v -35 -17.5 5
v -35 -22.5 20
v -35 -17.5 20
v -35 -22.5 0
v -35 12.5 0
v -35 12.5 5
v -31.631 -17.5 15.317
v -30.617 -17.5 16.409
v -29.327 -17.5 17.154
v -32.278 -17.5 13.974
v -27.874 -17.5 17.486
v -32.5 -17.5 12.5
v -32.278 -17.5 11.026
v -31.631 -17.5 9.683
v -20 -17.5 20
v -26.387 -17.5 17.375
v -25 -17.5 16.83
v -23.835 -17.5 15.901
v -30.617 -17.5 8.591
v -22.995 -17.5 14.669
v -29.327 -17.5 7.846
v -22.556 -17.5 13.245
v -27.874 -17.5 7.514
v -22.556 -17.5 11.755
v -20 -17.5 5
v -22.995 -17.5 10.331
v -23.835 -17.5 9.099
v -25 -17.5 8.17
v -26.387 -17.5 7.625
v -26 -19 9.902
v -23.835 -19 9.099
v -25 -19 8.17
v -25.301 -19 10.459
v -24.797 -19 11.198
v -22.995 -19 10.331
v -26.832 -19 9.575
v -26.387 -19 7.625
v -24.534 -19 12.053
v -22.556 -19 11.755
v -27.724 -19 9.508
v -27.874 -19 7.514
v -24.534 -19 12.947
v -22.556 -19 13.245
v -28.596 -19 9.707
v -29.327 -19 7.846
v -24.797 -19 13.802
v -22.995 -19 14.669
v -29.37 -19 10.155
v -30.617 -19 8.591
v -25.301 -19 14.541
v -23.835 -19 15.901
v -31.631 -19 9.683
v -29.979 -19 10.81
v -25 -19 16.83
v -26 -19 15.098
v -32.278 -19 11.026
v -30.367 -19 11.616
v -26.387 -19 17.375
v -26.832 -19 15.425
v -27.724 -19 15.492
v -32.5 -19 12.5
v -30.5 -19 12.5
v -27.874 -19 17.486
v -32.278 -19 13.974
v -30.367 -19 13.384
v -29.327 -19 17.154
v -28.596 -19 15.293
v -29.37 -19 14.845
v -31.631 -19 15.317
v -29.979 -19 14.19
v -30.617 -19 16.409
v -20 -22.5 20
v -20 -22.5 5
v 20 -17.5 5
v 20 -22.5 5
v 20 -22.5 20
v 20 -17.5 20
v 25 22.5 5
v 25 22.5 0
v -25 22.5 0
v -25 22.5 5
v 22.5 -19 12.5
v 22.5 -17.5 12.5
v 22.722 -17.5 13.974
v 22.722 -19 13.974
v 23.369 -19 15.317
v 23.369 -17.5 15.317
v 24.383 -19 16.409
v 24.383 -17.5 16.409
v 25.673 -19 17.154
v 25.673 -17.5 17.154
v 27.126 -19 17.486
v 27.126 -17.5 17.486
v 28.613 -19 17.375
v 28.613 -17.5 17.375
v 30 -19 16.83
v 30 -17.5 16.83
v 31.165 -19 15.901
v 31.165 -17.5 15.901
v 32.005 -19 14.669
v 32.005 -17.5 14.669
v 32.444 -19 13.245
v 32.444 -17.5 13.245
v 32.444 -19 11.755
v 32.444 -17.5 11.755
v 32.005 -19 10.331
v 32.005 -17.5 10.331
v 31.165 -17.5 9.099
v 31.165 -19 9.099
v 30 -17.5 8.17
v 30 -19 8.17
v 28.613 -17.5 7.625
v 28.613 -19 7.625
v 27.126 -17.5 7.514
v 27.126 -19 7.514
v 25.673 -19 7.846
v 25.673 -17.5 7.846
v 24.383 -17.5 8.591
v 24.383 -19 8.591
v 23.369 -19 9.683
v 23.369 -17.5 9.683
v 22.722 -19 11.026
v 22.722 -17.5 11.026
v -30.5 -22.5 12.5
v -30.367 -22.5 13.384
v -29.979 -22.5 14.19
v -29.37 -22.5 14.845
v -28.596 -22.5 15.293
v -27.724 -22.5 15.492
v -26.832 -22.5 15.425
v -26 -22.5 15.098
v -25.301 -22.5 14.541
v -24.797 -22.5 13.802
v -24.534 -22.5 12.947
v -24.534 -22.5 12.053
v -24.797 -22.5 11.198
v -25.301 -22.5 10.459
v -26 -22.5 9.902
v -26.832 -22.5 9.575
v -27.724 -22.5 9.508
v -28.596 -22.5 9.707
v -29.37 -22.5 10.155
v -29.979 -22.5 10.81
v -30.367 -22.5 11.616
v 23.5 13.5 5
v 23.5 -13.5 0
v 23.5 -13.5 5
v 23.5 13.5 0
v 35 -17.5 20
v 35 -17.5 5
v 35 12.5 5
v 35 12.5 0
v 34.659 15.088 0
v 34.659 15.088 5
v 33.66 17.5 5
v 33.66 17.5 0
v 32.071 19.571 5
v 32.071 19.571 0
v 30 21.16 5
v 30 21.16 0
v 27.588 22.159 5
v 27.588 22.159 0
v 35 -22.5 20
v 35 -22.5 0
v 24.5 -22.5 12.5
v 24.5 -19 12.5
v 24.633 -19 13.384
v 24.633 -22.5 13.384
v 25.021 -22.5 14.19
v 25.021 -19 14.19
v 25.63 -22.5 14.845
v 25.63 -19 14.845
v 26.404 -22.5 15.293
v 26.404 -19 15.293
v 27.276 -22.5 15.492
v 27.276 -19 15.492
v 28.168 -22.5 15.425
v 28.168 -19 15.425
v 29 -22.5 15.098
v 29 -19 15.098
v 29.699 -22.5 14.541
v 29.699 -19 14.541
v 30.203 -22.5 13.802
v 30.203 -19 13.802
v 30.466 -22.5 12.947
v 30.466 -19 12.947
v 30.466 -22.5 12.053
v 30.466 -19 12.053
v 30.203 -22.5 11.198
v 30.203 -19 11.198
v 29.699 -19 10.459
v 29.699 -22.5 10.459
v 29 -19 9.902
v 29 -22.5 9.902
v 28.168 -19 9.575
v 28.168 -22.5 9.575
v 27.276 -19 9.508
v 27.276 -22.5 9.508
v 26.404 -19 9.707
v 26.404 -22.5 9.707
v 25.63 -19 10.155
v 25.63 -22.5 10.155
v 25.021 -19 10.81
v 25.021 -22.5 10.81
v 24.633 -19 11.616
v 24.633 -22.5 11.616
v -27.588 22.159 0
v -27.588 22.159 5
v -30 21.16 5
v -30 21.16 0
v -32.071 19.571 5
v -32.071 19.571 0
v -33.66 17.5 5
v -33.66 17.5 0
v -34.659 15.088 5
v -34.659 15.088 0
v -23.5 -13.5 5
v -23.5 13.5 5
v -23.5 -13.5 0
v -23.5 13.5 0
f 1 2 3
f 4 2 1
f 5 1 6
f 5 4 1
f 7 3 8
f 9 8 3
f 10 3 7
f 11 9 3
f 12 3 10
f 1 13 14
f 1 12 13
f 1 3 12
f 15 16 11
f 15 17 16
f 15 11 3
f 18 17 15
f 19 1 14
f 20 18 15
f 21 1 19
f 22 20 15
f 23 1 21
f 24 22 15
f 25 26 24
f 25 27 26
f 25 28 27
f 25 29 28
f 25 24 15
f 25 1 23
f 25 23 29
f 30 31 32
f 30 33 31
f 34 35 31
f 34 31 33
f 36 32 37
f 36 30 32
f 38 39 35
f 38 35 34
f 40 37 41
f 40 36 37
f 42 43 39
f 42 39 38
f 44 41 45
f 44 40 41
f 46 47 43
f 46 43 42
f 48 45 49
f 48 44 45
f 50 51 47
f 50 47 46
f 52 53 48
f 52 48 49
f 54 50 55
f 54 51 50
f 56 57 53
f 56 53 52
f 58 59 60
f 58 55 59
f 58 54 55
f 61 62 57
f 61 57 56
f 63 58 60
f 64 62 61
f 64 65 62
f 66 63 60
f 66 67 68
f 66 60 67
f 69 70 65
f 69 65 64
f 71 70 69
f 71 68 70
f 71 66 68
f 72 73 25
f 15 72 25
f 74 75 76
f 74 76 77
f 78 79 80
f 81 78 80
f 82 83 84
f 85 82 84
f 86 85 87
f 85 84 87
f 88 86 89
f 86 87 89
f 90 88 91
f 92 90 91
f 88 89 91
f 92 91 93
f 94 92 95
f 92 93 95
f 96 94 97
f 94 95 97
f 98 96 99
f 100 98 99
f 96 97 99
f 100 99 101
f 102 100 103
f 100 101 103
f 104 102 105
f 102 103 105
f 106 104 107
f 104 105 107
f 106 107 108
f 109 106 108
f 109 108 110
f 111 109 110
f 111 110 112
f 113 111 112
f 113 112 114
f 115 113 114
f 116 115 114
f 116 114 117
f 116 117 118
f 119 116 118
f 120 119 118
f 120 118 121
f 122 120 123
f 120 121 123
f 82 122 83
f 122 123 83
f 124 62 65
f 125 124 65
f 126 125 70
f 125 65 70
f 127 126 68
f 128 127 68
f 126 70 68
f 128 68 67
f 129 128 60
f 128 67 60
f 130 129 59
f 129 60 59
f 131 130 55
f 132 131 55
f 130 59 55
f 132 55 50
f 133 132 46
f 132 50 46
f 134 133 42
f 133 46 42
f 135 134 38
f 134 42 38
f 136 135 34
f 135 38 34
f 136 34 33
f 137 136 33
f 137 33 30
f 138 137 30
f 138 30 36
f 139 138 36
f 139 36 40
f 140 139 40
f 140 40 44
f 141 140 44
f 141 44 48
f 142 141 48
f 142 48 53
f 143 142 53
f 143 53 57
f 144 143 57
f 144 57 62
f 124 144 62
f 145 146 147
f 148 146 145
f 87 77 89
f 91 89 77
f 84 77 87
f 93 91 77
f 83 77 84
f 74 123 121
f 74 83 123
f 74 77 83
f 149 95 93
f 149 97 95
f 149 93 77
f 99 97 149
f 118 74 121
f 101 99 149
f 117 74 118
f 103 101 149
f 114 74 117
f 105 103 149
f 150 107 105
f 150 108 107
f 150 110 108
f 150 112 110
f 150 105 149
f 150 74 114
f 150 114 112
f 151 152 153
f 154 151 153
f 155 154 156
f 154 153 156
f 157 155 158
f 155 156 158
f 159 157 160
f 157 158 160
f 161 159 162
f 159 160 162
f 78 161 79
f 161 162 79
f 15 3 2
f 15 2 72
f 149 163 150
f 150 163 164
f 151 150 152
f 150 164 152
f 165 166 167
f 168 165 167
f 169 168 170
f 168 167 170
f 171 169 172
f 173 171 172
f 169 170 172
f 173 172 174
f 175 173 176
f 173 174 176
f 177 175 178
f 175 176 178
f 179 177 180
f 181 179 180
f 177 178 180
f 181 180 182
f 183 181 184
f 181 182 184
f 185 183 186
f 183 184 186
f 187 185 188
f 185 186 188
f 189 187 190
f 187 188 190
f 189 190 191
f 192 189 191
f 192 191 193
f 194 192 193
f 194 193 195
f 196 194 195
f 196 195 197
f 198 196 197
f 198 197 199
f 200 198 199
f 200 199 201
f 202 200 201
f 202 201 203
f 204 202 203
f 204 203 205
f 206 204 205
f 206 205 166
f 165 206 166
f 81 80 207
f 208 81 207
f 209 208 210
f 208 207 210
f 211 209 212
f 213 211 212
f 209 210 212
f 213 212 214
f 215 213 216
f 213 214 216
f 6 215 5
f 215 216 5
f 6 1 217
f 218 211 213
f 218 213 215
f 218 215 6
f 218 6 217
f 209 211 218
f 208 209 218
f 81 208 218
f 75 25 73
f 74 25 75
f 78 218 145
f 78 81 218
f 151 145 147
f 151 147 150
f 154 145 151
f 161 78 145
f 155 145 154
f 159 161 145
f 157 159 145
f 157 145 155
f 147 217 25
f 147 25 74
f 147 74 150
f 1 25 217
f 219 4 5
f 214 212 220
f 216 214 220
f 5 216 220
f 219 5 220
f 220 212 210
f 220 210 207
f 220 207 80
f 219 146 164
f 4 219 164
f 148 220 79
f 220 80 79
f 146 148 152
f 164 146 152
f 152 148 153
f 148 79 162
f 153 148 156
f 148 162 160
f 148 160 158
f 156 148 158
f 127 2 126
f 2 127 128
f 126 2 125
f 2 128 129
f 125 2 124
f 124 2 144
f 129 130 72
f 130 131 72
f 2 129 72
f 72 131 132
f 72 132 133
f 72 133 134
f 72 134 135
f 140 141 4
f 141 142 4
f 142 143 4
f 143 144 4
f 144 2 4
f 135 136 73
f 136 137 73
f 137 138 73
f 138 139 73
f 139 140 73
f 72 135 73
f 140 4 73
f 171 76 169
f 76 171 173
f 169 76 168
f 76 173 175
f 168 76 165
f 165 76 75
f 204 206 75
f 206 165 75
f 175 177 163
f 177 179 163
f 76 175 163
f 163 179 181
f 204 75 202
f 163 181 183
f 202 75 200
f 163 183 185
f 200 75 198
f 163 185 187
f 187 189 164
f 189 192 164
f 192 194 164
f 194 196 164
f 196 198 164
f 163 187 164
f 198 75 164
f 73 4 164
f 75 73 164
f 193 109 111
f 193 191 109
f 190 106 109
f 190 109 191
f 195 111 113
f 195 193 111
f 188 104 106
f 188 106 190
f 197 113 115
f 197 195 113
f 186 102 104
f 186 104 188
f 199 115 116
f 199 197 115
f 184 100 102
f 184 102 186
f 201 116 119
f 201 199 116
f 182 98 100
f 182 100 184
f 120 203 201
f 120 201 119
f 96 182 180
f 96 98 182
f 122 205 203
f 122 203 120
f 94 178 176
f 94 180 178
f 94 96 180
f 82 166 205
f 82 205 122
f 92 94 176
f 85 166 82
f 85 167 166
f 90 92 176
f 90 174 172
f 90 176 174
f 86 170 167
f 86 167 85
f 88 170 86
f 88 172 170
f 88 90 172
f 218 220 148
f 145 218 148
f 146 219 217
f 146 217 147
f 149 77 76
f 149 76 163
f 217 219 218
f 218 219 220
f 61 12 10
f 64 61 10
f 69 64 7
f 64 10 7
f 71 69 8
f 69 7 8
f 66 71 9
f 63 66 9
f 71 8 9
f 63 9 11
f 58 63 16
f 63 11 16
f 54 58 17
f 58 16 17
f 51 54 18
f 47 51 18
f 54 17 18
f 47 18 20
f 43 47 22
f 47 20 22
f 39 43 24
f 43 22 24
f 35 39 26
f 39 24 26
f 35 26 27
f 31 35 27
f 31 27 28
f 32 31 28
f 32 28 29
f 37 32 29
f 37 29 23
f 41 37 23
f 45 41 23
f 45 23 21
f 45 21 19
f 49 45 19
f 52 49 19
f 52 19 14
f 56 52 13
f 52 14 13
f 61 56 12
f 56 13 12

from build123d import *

# Parameters (mm, degrees)
F1_DEPTH = 5
F2_W     = 47
F2_H     = 27
F3_DEPTH = 25
F4_W     = 15
F4_H     = 5
F5_DEPTH = 15
F6_R     = 3
F7_DEPTH = 25
F6_R_2   = 5
F8_DEPTH = 1.5


with BuildPart() as f1:
    # F0 (on Top) → F1 (new body)
    with BuildSketch(Plane.XY):
        with BuildLine():
            Line((-35, -22.5), (35, -22.5))
            Line((35, -22.5), (35, 12.5))
            ThreePointArc((35, 12.5), (32.071068, 19.571068), (25, 22.5))
            Line((25, 22.5), (-25, 22.5))
            ThreePointArc((-25, 22.5), (-32.071068, 19.571068), (-35, 12.5))
            Line((-35, 12.5), (-35, -22.5))
        make_face()
    extrude(amount=F1_DEPTH)

    # F2 (on Top) → F3 (cut)
    with BuildSketch(Plane.XY):
        Rectangle(F2_W, F2_H)
    extrude(amount=F3_DEPTH, mode=Mode.SUBTRACT)

    # F4 (on face) → F5 (join)
    with BuildSketch(Plane.XY.offset(5)):
        with Locations((-27.5, -20)):
            Rectangle(F4_W, F4_H)
        with Locations((27.5, -20)):
            Rectangle(F4_W, F4_H)
    extrude(amount=F5_DEPTH)

    # F6 (on face) → F7 (cut)
    with BuildSketch(Plane(origin=(0, -17.5, 0), x_dir=(-1, 0, 0), z_dir=(0, 1, 0))):
        with Locations((27.5, 12.5)):
            Circle(F6_R)
        with Locations((-27.5, 12.5)):
            Circle(F6_R)
    extrude(amount=-F7_DEPTH, mode=Mode.SUBTRACT)

    # F6 (on face) → F8 (cut)
    with BuildSketch(Plane(origin=(0, -17.5, 0), x_dir=(-1, 0, 0), z_dir=(0, 1, 0))):
        with Locations((27.5, 12.5)):
            Circle(F6_R_2)
        with Locations((27.5, 12.5)):
            Circle(F6_R, mode=Mode.SUBTRACT)
        with Locations((-27.5, 12.5)):
            Circle(F6_R_2)
        with Locations((-27.5, 12.5)):
            Circle(F6_R, mode=Mode.SUBTRACT)
    extrude(amount=-F8_DEPTH, mode=Mode.SUBTRACT)


solid = f1.part
